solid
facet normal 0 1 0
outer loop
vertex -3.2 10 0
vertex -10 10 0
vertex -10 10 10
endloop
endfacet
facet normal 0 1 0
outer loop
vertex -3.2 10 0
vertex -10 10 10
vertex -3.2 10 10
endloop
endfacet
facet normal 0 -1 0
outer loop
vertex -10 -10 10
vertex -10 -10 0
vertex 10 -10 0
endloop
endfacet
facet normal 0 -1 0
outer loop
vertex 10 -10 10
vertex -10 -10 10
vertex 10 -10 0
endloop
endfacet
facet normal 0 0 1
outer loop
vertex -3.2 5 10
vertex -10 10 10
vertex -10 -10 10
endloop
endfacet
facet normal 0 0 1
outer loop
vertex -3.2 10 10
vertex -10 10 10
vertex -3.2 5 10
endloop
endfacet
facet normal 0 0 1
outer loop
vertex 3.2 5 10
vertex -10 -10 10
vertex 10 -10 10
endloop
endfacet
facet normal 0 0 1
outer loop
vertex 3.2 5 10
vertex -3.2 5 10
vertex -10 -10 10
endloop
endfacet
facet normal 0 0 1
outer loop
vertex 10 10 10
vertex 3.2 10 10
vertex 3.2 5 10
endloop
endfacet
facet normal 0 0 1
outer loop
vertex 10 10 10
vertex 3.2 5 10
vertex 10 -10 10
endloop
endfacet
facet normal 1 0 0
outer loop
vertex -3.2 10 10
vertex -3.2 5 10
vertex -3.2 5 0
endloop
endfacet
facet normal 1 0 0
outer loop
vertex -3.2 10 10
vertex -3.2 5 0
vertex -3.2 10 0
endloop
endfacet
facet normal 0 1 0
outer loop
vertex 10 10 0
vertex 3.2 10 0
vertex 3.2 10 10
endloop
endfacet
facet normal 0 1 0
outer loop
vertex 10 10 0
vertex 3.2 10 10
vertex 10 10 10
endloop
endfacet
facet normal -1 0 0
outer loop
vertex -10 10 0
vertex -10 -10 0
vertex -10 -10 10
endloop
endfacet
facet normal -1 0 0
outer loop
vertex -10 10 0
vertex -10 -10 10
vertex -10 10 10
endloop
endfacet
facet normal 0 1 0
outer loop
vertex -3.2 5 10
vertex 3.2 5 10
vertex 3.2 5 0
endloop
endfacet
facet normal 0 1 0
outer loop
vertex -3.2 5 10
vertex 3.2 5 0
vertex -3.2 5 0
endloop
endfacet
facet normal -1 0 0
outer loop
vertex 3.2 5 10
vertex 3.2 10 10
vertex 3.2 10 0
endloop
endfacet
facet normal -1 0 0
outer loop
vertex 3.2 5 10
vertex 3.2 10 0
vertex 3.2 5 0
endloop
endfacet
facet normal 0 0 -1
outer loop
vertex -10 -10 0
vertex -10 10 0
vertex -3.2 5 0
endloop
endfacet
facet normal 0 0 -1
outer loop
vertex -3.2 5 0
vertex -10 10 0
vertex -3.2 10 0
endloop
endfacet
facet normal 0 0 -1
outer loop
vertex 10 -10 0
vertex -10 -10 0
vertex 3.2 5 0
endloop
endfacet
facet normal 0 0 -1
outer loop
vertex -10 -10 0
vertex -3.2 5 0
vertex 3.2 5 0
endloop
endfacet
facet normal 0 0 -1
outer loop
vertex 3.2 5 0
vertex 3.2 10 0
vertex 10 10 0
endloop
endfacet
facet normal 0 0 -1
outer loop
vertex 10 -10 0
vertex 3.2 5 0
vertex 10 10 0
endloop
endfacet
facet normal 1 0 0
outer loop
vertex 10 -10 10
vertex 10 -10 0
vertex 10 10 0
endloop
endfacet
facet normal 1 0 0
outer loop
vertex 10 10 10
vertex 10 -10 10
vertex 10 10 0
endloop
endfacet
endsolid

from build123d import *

# Parameters (mm, degrees)
SKETCH_1_W          = 20
SKETCH_1_H          = 20
EXTRUDE_1_DEPTH     = 10
CUT_EXTRUDE_1_DEPTH = 10


with BuildPart() as part:
    # 草图1 → 凸台-拉伸1 (new body)
    with BuildSketch(Plane.XY):
        Rectangle(SKETCH_1_W, SKETCH_1_H)
    extrude(amount=EXTRUDE_1_DEPTH)

    # 草图2 → 切除-拉伸1 (cut)
    with BuildSketch(Plane.XY.offset(10)):
        Polygon((0, 10), (3.2, 10), (3.2, 5), (-3.2, 5), (-3.2, 10), align=None)
    extrude(amount=-CUT_EXTRUDE_1_DEPTH, mode=Mode.SUBTRACT)


solid = part.part
